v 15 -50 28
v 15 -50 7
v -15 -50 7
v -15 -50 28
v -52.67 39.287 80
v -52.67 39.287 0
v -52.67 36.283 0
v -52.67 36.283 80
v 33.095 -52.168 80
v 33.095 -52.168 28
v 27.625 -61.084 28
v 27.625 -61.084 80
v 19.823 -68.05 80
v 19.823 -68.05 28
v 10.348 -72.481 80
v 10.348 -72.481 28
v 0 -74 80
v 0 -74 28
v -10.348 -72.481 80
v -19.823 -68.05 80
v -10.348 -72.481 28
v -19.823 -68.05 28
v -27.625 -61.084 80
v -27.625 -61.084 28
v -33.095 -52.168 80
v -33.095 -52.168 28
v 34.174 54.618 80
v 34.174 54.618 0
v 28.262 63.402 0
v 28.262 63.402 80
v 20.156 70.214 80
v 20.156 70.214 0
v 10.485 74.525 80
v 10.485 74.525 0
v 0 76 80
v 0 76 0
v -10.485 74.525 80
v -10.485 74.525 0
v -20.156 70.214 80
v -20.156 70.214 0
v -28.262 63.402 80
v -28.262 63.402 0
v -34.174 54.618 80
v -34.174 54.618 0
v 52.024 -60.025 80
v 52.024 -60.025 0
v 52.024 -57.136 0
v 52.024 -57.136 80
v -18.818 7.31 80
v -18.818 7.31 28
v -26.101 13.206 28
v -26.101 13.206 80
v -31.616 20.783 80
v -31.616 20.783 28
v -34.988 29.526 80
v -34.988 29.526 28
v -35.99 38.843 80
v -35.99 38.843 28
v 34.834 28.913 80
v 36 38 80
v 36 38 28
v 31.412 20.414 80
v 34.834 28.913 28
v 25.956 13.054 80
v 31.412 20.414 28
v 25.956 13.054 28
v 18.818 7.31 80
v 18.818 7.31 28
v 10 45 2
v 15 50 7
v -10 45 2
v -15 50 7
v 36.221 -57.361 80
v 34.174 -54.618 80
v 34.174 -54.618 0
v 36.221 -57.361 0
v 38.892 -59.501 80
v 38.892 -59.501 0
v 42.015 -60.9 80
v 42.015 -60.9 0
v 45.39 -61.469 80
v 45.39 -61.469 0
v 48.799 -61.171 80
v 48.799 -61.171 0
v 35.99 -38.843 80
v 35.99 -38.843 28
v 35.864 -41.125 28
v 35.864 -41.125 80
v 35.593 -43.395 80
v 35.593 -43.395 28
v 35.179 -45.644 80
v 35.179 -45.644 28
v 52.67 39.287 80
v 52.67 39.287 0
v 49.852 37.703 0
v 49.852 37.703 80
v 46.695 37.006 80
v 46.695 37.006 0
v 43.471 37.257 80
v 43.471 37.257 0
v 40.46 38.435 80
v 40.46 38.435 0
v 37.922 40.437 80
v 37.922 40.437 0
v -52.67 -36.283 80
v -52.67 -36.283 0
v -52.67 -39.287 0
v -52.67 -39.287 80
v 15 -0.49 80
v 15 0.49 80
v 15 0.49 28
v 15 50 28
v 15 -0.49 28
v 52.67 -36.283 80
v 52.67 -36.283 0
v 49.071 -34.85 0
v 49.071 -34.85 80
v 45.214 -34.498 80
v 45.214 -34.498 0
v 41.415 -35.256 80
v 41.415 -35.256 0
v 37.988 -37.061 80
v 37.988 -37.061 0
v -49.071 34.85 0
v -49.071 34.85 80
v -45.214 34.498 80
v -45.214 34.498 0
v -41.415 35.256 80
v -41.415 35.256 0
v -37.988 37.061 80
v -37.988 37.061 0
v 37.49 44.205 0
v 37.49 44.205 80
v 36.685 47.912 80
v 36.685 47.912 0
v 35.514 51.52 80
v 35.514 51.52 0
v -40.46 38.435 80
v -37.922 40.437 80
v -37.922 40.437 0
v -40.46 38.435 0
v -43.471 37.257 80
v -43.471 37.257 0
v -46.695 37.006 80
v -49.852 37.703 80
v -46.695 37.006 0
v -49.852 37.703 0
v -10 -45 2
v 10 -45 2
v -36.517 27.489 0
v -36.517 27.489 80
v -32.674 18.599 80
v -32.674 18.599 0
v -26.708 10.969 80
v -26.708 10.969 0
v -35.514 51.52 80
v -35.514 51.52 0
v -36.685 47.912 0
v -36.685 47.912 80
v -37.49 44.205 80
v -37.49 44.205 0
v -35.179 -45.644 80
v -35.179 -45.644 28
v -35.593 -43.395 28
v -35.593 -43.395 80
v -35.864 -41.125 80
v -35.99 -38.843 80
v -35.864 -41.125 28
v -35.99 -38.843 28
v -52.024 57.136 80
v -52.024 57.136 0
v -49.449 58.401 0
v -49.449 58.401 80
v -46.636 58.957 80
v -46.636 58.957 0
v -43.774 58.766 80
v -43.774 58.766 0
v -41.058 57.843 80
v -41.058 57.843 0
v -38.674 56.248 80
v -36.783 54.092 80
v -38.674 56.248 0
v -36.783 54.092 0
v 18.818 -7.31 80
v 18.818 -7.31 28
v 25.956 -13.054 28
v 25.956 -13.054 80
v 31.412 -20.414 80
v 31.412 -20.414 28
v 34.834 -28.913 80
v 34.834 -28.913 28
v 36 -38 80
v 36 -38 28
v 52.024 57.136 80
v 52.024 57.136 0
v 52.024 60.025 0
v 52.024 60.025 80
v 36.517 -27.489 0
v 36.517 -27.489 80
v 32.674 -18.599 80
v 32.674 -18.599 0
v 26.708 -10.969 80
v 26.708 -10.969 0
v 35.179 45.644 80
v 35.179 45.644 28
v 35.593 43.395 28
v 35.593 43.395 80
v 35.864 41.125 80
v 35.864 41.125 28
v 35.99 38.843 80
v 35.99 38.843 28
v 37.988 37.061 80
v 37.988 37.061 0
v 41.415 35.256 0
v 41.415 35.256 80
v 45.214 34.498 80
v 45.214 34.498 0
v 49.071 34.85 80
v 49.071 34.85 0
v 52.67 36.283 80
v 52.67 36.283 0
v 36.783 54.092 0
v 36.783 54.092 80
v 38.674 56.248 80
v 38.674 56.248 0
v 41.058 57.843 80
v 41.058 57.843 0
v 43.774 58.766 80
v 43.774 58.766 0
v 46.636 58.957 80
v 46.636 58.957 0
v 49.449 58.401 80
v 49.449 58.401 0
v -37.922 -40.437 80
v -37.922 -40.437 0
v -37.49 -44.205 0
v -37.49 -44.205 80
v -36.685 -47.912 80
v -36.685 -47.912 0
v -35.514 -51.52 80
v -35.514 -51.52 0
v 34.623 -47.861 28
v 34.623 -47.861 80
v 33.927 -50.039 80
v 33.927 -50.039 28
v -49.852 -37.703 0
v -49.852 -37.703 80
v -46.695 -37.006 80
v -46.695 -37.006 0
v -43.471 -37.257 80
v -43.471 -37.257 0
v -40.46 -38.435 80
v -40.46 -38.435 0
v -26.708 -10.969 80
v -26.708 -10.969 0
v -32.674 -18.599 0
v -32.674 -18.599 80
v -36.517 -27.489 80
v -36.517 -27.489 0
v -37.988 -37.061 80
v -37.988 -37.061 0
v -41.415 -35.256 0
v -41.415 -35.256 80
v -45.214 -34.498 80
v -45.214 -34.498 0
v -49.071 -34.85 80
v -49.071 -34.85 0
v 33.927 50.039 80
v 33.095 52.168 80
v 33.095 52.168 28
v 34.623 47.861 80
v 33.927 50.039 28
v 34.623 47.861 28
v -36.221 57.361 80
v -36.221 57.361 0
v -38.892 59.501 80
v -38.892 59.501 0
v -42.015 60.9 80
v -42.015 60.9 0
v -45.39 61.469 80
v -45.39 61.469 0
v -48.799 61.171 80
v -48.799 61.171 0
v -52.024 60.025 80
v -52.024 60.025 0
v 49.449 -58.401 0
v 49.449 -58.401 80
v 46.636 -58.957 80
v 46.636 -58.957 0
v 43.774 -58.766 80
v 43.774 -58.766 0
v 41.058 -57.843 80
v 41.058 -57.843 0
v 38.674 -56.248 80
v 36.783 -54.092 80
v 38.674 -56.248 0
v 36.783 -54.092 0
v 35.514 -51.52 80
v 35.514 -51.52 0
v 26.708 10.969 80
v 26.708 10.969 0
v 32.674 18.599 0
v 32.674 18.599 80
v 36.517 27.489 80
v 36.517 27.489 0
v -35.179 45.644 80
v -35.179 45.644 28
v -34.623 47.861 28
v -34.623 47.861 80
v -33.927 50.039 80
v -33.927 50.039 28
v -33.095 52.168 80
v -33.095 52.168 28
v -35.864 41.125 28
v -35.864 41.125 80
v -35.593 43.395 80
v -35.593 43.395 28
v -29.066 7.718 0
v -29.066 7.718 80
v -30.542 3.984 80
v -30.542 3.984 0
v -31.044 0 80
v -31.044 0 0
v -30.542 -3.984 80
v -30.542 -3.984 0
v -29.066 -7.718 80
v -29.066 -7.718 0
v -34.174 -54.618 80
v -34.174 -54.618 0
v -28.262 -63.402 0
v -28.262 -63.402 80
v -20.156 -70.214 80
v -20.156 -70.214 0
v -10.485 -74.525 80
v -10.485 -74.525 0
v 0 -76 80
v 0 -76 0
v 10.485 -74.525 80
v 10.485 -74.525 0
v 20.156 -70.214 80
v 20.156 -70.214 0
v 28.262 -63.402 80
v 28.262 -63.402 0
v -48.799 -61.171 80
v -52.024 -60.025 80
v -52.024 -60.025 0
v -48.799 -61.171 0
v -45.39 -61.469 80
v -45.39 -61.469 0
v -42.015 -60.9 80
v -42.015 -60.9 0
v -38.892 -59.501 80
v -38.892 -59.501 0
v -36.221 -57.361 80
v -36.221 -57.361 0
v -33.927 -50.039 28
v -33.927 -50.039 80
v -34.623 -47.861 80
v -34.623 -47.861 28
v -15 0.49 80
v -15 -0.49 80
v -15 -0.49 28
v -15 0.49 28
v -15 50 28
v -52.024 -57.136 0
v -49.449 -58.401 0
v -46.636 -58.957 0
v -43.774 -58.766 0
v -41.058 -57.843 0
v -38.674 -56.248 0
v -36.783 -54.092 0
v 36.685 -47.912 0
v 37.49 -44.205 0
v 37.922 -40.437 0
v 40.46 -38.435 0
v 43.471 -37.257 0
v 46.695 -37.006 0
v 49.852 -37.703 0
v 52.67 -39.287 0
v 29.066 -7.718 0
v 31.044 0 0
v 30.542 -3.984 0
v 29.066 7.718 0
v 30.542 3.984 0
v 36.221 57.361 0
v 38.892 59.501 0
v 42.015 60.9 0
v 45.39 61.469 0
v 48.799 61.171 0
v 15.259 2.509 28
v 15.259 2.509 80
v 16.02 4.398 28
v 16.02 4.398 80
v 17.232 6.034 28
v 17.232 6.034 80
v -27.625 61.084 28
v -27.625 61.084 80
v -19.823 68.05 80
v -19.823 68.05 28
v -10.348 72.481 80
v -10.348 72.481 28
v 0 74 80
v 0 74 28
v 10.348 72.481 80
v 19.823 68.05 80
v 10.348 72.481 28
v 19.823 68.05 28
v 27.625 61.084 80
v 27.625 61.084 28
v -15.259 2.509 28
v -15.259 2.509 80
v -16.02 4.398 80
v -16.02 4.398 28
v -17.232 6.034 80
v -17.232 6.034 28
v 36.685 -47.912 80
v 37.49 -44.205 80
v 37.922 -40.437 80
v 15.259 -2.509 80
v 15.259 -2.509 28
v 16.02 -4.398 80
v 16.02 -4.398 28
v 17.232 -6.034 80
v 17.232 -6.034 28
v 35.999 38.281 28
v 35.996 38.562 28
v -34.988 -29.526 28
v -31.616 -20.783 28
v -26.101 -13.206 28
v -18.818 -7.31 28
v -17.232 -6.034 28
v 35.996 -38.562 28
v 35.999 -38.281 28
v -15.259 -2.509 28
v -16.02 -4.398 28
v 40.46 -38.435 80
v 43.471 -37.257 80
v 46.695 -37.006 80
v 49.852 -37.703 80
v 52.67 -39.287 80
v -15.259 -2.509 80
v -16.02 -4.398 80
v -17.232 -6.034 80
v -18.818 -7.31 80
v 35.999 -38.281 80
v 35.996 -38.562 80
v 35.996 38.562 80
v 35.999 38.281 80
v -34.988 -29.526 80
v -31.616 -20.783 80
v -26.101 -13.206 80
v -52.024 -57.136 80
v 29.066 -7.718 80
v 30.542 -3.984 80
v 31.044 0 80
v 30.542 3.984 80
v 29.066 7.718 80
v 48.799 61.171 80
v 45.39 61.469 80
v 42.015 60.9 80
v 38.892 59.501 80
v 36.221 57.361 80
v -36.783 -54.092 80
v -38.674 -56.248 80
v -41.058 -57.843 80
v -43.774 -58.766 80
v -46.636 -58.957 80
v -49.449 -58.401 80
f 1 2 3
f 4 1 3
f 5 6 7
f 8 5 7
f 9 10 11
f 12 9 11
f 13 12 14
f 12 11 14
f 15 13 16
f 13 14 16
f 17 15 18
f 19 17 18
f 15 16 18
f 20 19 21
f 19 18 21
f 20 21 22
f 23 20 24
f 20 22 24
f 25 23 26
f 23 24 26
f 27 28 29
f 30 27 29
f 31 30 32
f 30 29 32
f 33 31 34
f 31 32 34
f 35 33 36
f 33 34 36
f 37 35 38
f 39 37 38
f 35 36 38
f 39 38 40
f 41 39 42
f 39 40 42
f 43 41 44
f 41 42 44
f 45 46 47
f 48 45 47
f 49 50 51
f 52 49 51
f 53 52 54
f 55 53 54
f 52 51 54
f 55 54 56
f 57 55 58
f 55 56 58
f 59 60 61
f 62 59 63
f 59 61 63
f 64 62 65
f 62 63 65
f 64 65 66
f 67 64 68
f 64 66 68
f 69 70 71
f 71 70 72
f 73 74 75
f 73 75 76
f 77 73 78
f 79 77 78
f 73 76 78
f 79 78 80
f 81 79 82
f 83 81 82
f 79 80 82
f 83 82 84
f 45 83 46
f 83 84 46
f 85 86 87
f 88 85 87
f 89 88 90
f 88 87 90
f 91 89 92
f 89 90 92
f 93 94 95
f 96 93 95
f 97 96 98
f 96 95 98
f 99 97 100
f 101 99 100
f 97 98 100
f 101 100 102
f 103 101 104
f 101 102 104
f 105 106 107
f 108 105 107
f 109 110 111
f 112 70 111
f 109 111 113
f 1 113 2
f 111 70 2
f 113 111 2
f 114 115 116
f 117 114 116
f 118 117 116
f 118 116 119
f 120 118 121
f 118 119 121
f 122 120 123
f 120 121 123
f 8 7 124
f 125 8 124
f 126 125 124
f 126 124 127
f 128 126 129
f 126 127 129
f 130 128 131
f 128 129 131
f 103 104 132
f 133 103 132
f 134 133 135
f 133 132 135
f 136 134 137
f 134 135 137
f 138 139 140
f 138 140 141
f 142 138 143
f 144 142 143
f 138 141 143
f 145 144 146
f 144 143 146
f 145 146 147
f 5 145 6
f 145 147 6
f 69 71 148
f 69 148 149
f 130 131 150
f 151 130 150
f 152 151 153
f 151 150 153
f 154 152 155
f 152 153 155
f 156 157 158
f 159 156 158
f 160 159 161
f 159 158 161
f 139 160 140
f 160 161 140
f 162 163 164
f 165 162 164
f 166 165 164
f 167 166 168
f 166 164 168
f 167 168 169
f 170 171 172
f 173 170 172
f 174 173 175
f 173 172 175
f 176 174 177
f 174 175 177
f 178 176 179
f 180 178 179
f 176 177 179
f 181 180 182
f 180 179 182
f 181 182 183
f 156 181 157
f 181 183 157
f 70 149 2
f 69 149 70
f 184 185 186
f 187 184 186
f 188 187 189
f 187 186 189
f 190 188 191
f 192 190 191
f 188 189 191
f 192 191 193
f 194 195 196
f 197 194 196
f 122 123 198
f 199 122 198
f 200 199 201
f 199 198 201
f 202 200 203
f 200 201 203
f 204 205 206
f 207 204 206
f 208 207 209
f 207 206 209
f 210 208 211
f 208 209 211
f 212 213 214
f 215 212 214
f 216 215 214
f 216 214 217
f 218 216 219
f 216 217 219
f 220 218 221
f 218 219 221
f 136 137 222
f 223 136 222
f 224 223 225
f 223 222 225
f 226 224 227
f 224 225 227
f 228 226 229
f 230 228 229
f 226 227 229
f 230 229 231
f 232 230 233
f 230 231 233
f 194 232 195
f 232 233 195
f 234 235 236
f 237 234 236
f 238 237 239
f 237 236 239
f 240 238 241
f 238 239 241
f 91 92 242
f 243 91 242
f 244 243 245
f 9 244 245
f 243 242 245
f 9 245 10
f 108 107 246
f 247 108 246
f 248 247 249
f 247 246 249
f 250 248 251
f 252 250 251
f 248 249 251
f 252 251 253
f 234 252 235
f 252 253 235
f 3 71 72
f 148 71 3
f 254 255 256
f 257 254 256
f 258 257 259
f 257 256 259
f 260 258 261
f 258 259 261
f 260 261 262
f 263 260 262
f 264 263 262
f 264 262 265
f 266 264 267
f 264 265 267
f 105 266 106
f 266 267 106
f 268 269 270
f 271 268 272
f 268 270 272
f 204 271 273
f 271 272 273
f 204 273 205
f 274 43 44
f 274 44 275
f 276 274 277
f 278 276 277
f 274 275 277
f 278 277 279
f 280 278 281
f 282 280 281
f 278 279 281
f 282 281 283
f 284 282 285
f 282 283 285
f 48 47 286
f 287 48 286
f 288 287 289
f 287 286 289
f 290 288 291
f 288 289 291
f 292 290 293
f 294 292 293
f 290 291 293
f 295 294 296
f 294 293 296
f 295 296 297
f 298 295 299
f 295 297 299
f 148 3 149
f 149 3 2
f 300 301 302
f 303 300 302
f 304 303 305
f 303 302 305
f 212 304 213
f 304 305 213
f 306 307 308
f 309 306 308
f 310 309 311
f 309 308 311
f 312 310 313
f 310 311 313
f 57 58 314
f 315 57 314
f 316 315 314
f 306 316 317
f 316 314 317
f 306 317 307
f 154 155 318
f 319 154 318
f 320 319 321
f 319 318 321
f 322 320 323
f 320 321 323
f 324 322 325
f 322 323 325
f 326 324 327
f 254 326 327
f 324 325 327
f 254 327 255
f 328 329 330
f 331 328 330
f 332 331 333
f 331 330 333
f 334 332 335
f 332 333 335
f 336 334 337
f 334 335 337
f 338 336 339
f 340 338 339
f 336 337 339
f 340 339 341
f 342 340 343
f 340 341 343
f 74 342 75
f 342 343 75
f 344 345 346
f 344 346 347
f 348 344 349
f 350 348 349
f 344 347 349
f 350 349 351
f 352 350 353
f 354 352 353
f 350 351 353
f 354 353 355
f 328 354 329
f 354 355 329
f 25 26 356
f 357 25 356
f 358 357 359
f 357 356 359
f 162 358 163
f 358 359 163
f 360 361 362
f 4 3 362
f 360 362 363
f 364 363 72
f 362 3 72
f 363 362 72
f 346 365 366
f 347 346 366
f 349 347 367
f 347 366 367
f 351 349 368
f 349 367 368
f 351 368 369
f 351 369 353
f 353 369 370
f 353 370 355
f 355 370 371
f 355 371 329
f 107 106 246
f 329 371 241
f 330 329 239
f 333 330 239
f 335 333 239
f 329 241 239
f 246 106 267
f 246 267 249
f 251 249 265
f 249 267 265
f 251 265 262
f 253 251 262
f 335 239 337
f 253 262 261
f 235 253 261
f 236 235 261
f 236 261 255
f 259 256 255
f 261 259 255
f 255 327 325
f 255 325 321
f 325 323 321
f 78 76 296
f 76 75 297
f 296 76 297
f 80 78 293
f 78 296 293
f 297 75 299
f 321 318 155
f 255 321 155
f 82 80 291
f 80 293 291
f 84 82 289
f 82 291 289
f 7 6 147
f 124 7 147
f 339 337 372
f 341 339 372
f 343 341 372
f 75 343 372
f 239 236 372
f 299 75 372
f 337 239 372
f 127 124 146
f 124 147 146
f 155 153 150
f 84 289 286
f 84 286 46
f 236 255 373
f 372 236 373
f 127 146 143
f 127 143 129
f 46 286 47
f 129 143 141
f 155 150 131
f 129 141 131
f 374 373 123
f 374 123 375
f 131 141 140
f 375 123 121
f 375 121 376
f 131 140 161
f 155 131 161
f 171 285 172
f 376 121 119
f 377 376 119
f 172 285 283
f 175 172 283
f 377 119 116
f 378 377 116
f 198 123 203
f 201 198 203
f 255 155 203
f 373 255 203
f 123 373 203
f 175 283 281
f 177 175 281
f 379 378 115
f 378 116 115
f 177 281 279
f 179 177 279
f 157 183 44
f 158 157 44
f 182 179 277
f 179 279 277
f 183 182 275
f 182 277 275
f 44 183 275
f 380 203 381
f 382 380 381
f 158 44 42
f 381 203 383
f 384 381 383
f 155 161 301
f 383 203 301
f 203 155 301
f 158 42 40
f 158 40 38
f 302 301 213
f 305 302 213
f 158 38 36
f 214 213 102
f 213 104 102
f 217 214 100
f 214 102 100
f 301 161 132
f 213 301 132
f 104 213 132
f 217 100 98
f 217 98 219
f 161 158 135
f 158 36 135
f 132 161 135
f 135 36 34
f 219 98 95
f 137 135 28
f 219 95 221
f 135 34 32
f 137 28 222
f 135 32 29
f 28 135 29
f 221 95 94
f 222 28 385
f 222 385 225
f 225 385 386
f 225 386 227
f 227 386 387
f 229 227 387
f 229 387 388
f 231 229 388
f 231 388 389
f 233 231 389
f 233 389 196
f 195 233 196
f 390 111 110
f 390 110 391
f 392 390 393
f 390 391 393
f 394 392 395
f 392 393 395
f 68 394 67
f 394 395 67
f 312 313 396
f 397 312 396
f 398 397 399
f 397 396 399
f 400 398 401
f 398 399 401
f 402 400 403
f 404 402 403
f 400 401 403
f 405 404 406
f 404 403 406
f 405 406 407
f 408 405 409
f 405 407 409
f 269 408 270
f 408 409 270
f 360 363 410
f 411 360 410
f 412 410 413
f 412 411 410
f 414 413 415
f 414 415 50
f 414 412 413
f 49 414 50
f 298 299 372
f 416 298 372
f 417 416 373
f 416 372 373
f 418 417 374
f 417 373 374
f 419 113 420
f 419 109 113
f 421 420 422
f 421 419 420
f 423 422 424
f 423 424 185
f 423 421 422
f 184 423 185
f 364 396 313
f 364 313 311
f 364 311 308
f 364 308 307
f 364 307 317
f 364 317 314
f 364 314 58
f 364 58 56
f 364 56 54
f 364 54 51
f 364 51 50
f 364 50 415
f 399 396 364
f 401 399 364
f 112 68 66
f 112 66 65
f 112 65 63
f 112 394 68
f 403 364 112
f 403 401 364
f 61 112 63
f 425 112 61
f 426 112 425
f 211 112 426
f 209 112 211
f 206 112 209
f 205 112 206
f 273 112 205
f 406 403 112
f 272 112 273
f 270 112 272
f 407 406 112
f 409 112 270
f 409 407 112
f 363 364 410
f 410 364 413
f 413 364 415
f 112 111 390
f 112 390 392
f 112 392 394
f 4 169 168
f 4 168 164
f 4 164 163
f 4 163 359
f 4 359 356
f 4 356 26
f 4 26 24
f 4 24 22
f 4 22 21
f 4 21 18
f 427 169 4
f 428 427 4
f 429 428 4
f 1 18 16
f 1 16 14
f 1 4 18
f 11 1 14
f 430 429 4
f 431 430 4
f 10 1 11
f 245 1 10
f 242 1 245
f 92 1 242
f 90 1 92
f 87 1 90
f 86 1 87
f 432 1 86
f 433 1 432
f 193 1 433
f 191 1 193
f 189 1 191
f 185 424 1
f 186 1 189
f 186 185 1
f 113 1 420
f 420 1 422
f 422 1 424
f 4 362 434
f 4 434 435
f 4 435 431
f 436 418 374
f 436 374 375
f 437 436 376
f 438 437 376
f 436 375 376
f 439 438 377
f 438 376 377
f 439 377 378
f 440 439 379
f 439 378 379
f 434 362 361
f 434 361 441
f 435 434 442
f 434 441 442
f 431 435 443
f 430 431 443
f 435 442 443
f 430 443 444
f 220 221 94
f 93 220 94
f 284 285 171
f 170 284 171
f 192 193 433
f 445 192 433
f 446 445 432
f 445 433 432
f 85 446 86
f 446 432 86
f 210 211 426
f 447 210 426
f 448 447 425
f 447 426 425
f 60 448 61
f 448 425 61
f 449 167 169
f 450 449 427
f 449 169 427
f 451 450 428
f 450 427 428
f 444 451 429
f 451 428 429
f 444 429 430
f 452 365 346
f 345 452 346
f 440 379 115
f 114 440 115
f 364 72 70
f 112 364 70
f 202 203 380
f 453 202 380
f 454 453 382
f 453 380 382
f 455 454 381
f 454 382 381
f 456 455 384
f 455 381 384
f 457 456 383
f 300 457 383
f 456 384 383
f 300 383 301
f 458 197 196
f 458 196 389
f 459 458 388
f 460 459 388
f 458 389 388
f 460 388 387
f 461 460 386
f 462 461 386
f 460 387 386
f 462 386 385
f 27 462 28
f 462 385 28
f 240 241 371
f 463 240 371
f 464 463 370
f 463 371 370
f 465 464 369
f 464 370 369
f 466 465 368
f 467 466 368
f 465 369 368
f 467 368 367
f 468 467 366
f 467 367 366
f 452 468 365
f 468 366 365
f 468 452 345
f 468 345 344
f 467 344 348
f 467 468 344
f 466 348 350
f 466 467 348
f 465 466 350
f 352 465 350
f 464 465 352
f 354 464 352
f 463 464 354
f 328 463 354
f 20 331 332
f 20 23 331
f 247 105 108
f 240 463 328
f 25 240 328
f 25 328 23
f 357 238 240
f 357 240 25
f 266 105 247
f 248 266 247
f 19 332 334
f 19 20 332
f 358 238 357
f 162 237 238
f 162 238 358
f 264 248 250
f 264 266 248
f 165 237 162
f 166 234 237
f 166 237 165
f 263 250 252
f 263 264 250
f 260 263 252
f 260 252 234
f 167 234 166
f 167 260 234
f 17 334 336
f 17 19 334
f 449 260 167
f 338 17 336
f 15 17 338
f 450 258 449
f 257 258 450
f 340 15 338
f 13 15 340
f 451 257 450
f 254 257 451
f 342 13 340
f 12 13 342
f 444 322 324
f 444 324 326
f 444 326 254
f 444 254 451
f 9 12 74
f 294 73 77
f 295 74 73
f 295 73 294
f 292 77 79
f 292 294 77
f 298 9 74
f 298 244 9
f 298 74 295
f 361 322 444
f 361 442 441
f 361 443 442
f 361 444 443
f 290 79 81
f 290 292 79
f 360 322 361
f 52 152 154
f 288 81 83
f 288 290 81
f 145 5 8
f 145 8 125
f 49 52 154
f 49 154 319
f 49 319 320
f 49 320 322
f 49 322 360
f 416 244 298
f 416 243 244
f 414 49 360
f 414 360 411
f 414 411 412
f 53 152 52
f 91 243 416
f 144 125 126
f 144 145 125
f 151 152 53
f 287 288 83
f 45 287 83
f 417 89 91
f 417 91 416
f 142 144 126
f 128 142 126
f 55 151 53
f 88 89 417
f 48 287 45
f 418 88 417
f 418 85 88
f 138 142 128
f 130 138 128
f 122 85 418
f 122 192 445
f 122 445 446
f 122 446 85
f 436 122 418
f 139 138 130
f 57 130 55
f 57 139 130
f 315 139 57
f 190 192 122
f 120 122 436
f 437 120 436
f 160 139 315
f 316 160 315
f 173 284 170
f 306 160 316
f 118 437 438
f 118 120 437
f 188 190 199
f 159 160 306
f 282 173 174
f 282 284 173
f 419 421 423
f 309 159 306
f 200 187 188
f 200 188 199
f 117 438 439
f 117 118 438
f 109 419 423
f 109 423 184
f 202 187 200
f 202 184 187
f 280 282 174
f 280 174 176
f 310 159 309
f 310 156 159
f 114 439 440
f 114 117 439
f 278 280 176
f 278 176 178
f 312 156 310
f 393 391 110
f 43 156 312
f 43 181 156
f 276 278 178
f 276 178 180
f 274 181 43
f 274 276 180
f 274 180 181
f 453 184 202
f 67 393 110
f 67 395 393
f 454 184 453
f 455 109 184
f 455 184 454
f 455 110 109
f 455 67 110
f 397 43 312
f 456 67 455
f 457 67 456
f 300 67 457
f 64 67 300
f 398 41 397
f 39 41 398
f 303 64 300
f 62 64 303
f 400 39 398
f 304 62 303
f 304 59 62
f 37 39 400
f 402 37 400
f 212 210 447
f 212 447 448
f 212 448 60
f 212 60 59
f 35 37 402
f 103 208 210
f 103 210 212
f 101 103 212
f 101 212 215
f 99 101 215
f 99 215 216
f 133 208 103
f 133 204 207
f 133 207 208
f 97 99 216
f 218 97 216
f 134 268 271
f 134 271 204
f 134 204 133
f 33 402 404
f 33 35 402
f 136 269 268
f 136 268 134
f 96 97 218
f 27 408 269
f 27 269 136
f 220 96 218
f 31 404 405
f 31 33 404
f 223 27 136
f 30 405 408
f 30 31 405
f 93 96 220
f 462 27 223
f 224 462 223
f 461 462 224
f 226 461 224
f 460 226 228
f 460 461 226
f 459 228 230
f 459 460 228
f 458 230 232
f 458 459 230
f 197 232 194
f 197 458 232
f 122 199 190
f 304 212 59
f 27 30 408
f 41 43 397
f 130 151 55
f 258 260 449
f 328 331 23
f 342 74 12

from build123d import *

# Parameters (mm, degrees)
F1_DEPTH = 80
F2_DEPTH = 28
F3_DEPTH = 2
F4_SIZE  = 5
F5_R     = 8


with BuildPart() as f1:
    # F0 (on Top) → F1 (new body)
    with BuildSketch(Plane.XY):
        with BuildLine():
            ThreePointArc((35.9901375525, 38.8426143551), (35.9975343037, 38.4213360355), (36, 38))
            ThreePointArc((36, 38), (30.2985148151, 18.5577779048), (15, 5.2738636561))
            Line((15, 5.2738636561), (15, 3.0858194998))
            ThreePointArc((15, 3.0858194998), (21.2234490436, 6.479130553), (26.7084002829, 10.9692516876))
            ThreePointArc((26.7084002829, 10.9692516876), (34.8800432225, 22.9207896494), (37.9884032406, 37.061267222))
            ThreePointArc((37.9884032406, 37.061267222), (36.9450072331, 37.9022876024), (35.9901375525, 38.8426143551))
        make_face()
        with BuildLine():
            ThreePointArc((35.1791296525, 45.6438757771), (35.7467542283, 42.2625769371), (35.9901375525, 38.8426143551))
            ThreePointArc((35.9901375525, 38.8426143551), (36.9450072331, 37.9022876024), (37.9884032406, 37.061267222))
            ThreePointArc((37.9884032406, 37.061267222), (37.9971006995, 37.5305977968), (38, 38))
            ThreePointArc((38, 38), (37.9804456747, 39.2189119535), (37.9218028237, 40.4365694333))
            ThreePointArc((37.9218028237, 40.4365694333), (36.1957376365, 42.853388078), (35.1791296525, 45.6438757771))
        make_face()
        with BuildLine():
            ThreePointArc((35.5135906601, 51.5197957984), (34.9460846772, 48.604619716), (35.1791296525, 45.6438757771))
            ThreePointArc((35.1791296525, 45.6438757771), (36.1957376365, 42.853388078), (37.9218028237, 40.4365694333))
            ThreePointArc((37.9218028237, 40.4365694333), (37.133525697, 46.0685357598), (35.5135906601, 51.5197957984))
        make_face()
        with BuildLine():
            ThreePointArc((33.0946454877, 52.1684311073), (34.2924124047, 48.9558409747), (35.1791296525, 45.6438757771))
            ThreePointArc((35.1791296525, 45.6438757771), (34.9460846772, 48.604619716), (35.5135906601, 51.5197957984))
            ThreePointArc((35.5135906601, 51.5197957984), (34.8779796603, 53.083982724), (34.1735140679, 54.6183915062))
            ThreePointArc((34.1735140679, 54.6183915062), (33.5732028181, 53.4202191846), (33.0946454877, 52.1684311073))
        make_face()
        with BuildLine():
            ThreePointArc((38, 38), (37.9971006995, 37.5305977968), (37.9884032406, 37.061267222))
            ThreePointArc((37.9884032406, 37.061267222), (45.2139181623, 34.4984199692), (52.669826296, 36.2832689338))
            Line((52.669826296, 36.2832689338), (52.669826296, 39.2874432971))
            ThreePointArc((52.669826296, 39.2874432971), (45.0738077793, 37.0127445593), (37.9218028237, 40.4365694333))
            ThreePointArc((37.9218028237, 40.4365694333), (37.9804456747, 39.2189119535), (38, 38))
        make_face()
        with BuildLine():
            Line((-15, 3.0858194998), (-15, 5.2738636561))
            ThreePointArc((-15, 5.2738636561), (-30.5239870885, 18.9137166473), (-35.9901375525, 38.8426143551))
            ThreePointArc((-35.9901375525, 38.8426143551), (-36.9450072331, 37.9022876024), (-37.9884032406, 37.061267222))
            ThreePointArc((-37.9884032406, 37.061267222), (-34.8800432225, 22.9207896494), (-26.7084002829, 10.9692516876))
            ThreePointArc((-26.7084002829, 10.9692516876), (-21.2234490436, 6.479130553), (-15, 3.0858194998))
        make_face()
        with BuildLine():
            ThreePointArc((26.7084002829, 10.9692516876), (21.2234490436, 6.479130553), (15, 3.0858194998))
            Line((15, 3.0858194998), (15, -3.0858194998))
            ThreePointArc((15, -3.0858194998), (21.2234490436, -6.479130553), (26.7084002829, -10.9692516876))
            ThreePointArc((26.7084002829, -10.9692516876), (31.0440368913, 0), (26.7084002829, 10.9692516876))
        make_face()
        with BuildLine():
            ThreePointArc((-33.0946454877, 52.1684311073), (0, 74), (33.0946454877, 52.1684311073))
            ThreePointArc((33.0946454877, 52.1684311073), (33.5732028181, 53.4202191846), (34.1735140679, 54.6183915062))
            ThreePointArc((34.1735140679, 54.6183915062), (0, 76), (-34.1735140679, 54.6183915062))
            ThreePointArc((-34.1735140679, 54.6183915062), (-33.5732028181, 53.4202191846), (-33.0946454877, 52.1684311073))
        make_face()
        with BuildLine():
            ThreePointArc((34.1735140679, 54.6183915062), (34.8779796603, 53.083982724), (35.5135906601, 51.5197957984))
            ThreePointArc((35.5135906601, 51.5197957984), (42.3857590226, 58.3934543446), (52.0238642089, 57.1361523796))
            Line((52.0238642089, 57.1361523796), (52.0238642089, 60.0250099634))
            ThreePointArc((52.0238642089, 60.0250099634), (42.0149177213, 60.8998521098), (34.1735140679, 54.6183915062))
        make_face()
        with BuildLine():
            ThreePointArc((-37.9884032406, 37.061267222), (-36.9450072331, 37.9022876024), (-35.9901375525, 38.8426143551))
            ThreePointArc((-35.9901375525, 38.8426143551), (-35.7467542312, 42.2625769128), (-35.1791296629, 45.6438757292))
            ThreePointArc((-35.1791296629, 45.6438757292), (-36.1957376479, 42.8533880563), (-37.9218028237, 40.4365694333))
            ThreePointArc((-37.9218028237, 40.4365694333), (-37.9926047072, 38.749658299), (-37.9884032406, 37.061267222))
        make_face()
        with BuildLine():
            Line((-15, -3.0858194998), (-15, 3.0858194998))
            ThreePointArc((-15, 3.0858194998), (-21.2234490436, 6.479130553), (-26.7084002829, 10.9692516876))
            ThreePointArc((-26.7084002829, 10.9692516876), (-31.0440368913, 0), (-26.7084002829, -10.9692516876))
            ThreePointArc((-26.7084002829, -10.9692516876), (-21.2234490436, -6.479130553), (-15, -3.0858194998))
        make_face()
        with BuildLine():
            ThreePointArc((26.7084002829, -10.9692516876), (21.2234490436, -6.479130553), (15, -3.0858194998))
            Line((15, -3.0858194998), (15, -5.2738636561))
            ThreePointArc((15, -5.2738636561), (30.2985148151, -18.5577779048), (36, -38))
            ThreePointArc((36, -38), (35.9975343037, -38.4213360355), (35.9901375525, -38.8426143551))
            ThreePointArc((35.9901375525, -38.8426143551), (36.9450072331, -37.9022876024), (37.9884032406, -37.061267222))
            ThreePointArc((37.9884032406, -37.061267222), (34.8800432225, -22.9207896494), (26.7084002829, -10.9692516876))
        make_face()
        with BuildLine():
            ThreePointArc((-35.1791296629, 45.6438757292), (-34.2924124122, 48.9558409514), (-33.0946454877, 52.1684311073))
            ThreePointArc((-33.0946454877, 52.1684311073), (-33.5732028181, 53.4202191846), (-34.1735140679, 54.6183915062))
            ThreePointArc((-34.1735140679, 54.6183915062), (-34.8779796603, 53.083982724), (-35.5135906601, 51.5197957984))
            ThreePointArc((-35.5135906601, 51.5197957984), (-34.9460846758, 48.6046196915), (-35.1791296629, 45.6438757292))
        make_face()
        with BuildLine():
            ThreePointArc((-37.9218028237, 40.4365694333), (-36.1957376479, 42.8533880563), (-35.1791296629, 45.6438757292))
            ThreePointArc((-35.1791296629, 45.6438757292), (-34.9460846758, 48.6046196915), (-35.5135906601, 51.5197957984))
            ThreePointArc((-35.5135906601, 51.5197957984), (-37.133525697, 46.0685357598), (-37.9218028237, 40.4365694333))
        make_face()
        with BuildLine():
            ThreePointArc((-52.669826296, 36.2832689338), (-45.2139181623, 34.4984199692), (-37.9884032406, 37.061267222))
            ThreePointArc((-37.9884032406, 37.061267222), (-37.9926047072, 38.749658299), (-37.9218028237, 40.4365694333))
            ThreePointArc((-37.9218028237, 40.4365694333), (-45.0738077793, 37.0127445593), (-52.669826296, 39.2874432971))
            Line((-52.669826296, 39.2874432971), (-52.669826296, 36.2832689338))
        make_face()
        with BuildLine():
            Line((-15, -5.2738636561), (-15, -3.0858194998))
            ThreePointArc((-15, -3.0858194998), (-21.2234490436, -6.479130553), (-26.7084002829, -10.9692516876))
            ThreePointArc((-26.7084002829, -10.9692516876), (-34.8800432225, -22.9207896494), (-37.9884032406, -37.061267222))
            ThreePointArc((-37.9884032406, -37.061267222), (-36.9450072331, -37.9022876024), (-35.9901375525, -38.8426143551))
            ThreePointArc((-35.9901375525, -38.8426143551), (-30.5239870885, -18.9137166473), (-15, -5.2738636561))
        make_face()
        with BuildLine():
            ThreePointArc((-35.5135906601, 51.5197957984), (-34.8779796603, 53.083982724), (-34.1735140679, 54.6183915062))
            ThreePointArc((-34.1735140679, 54.6183915062), (-42.0149177213, 60.8998521098), (-52.0238642089, 60.0250099634))
            Line((-52.0238642089, 60.0250099634), (-52.0238642089, 57.1361523796))
            ThreePointArc((-52.0238642089, 57.1361523796), (-42.3857590226, 58.3934543446), (-35.5135906601, 51.5197957984))
        make_face()
        with BuildLine():
            ThreePointArc((52.669826296, -36.2832689338), (45.2139181623, -34.4984199692), (37.9884032406, -37.061267222))
            ThreePointArc((37.9884032406, -37.061267222), (37.9971006995, -37.5305977968), (38, -38))
            ThreePointArc((38, -38), (37.9804456747, -39.2189119535), (37.9218028237, -40.4365694333))
            ThreePointArc((37.9218028237, -40.4365694333), (45.0738077793, -37.0127445593), (52.669826296, -39.2874432971))
            Line((52.669826296, -39.2874432971), (52.669826296, -36.2832689338))
        make_face()
        with BuildLine():
            ThreePointArc((38, -38), (37.9971006995, -37.5305977968), (37.9884032406, -37.061267222))
            ThreePointArc((37.9884032406, -37.061267222), (36.9450072331, -37.9022876024), (35.9901375525, -38.8426143551))
            ThreePointArc((35.9901375525, -38.8426143551), (35.746754198, -42.2625771912), (35.1791295438, -45.6438762771))
            ThreePointArc((35.1791295438, -45.6438762771), (36.1957375172, -42.8533883044), (37.9218028237, -40.4365694333))
            ThreePointArc((37.9218028237, -40.4365694333), (37.9804456747, -39.2189119535), (38, -38))
        make_face()
        with BuildLine():
            ThreePointArc((-35.9901375525, -38.8426143551), (-36.9450072331, -37.9022876024), (-37.9884032406, -37.061267222))
            ThreePointArc((-37.9884032406, -37.061267222), (-37.9926047072, -38.749658299), (-37.9218028237, -40.4365694333))
            ThreePointArc((-37.9218028237, -40.4365694333), (-36.1957375881, -42.8533881697), (-35.1791296084, -45.6438759798))
            ThreePointArc((-35.1791296084, -45.6438759798), (-35.746754216, -42.2625770401), (-35.9901375525, -38.8426143551))
        make_face()
        with BuildLine():
            ThreePointArc((-37.9218028237, -40.4365694333), (-37.9926047072, -38.749658299), (-37.9884032406, -37.061267222))
            ThreePointArc((-37.9884032406, -37.061267222), (-45.2139181623, -34.4984199692), (-52.669826296, -36.2832689338))
            Line((-52.669826296, -36.2832689338), (-52.669826296, -39.2874432971))
            ThreePointArc((-52.669826296, -39.2874432971), (-45.0738077793, -37.0127445593), (-37.9218028237, -40.4365694333))
        make_face()
        with BuildLine():
            ThreePointArc((35.5135906601, -51.5197957984), (37.133525697, -46.0685357598), (37.9218028237, -40.4365694333))
            ThreePointArc((37.9218028237, -40.4365694333), (36.1957375172, -42.8533883044), (35.1791295438, -45.6438762771))
            ThreePointArc((35.1791295438, -45.6438762771), (34.9460846917, -48.6046199714), (35.5135906601, -51.5197957984))
        make_face()
        with BuildLine():
            ThreePointArc((35.5135906601, -51.5197957984), (34.9460846917, -48.6046199714), (35.1791295438, -45.6438762771))
            ThreePointArc((35.1791295438, -45.6438762771), (34.2924123269, -48.9558412184), (33.0946454877, -52.1684311073))
            ThreePointArc((33.0946454877, -52.1684311073), (33.5732028181, -53.4202191846), (34.1735140679, -54.6183915062))
            ThreePointArc((34.1735140679, -54.6183915062), (34.8779796603, -53.083982724), (35.5135906601, -51.5197957984))
        make_face()
        with BuildLine():
            ThreePointArc((-35.1791296084, -45.6438759798), (-36.1957375881, -42.8533881697), (-37.9218028237, -40.4365694333))
            ThreePointArc((-37.9218028237, -40.4365694333), (-37.133525697, -46.0685357598), (-35.5135906601, -51.5197957984))
            ThreePointArc((-35.5135906601, -51.5197957984), (-34.9460846831, -48.6046198195), (-35.1791296084, -45.6438759798))
        make_face()
        with BuildLine():
            ThreePointArc((-33.0946454877, -52.1684311073), (-34.2924123732, -48.9558410735), (-35.1791296084, -45.6438759798))
            ThreePointArc((-35.1791296084, -45.6438759798), (-34.9460846831, -48.6046198195), (-35.5135906601, -51.5197957984))
            ThreePointArc((-35.5135906601, -51.5197957984), (-34.8779796603, -53.083982724), (-34.1735140679, -54.6183915062))
            ThreePointArc((-34.1735140679, -54.6183915062), (-33.5732028181, -53.4202191846), (-33.0946454877, -52.1684311073))
        make_face()
        with BuildLine():
            ThreePointArc((52.0238642089, -57.1361523796), (42.3857590226, -58.3934543446), (35.5135906601, -51.5197957984))
            ThreePointArc((35.5135906601, -51.5197957984), (34.8779796603, -53.083982724), (34.1735140679, -54.6183915062))
            ThreePointArc((34.1735140679, -54.6183915062), (42.0149177213, -60.8998521098), (52.0238642089, -60.0250099634))
            Line((52.0238642089, -60.0250099634), (52.0238642089, -57.1361523796))
        make_face()
        with BuildLine():
            ThreePointArc((34.1735140679, -54.6183915062), (33.5732028181, -53.4202191846), (33.0946454877, -52.1684311073))
            ThreePointArc((33.0946454877, -52.1684311073), (0, -74), (-33.0946454877, -52.1684311073))
            ThreePointArc((-33.0946454877, -52.1684311073), (-33.5732028181, -53.4202191846), (-34.1735140679, -54.6183915062))
            ThreePointArc((-34.1735140679, -54.6183915062), (0, -76), (34.1735140679, -54.6183915062))
        make_face()
        with BuildLine():
            ThreePointArc((-34.1735140679, -54.6183915062), (-34.8779796603, -53.083982724), (-35.5135906601, -51.5197957984))
            ThreePointArc((-35.5135906601, -51.5197957984), (-42.3857590226, -58.3934543446), (-52.0238642089, -57.1361523796))
            Line((-52.0238642089, -57.1361523796), (-52.0238642089, -60.0250099634))
            ThreePointArc((-52.0238642089, -60.0250099634), (-42.0149177213, -60.8998521098), (-34.1735140679, -54.6183915062))
        make_face()
    extrude(amount=F1_DEPTH)

    # F0 (on Top) → F2 (join)
    with BuildSketch(Plane.XY):
        with BuildLine():
            ThreePointArc((15, 5.2738636561), (30.2985148151, 18.5577779048), (36, 38))
            ThreePointArc((36, 38), (35.9975343037, 38.4213360355), (35.9901375525, 38.8426143551))
            ThreePointArc((35.9901375525, 38.8426143551), (35.7467542283, 42.2625769371), (35.1791296525, 45.6438757771))
            ThreePointArc((35.1791296525, 45.6438757771), (34.2924124047, 48.9558409747), (33.0946454877, 52.1684311073))
            ThreePointArc((33.0946454877, 52.1684311073), (0, 74), (-33.0946454877, 52.1684311073))
            ThreePointArc((-33.0946454877, 52.1684311073), (-34.2924124122, 48.9558409514), (-35.1791296629, 45.6438757292))
            ThreePointArc((-35.1791296629, 45.6438757292), (-35.7467542312, 42.2625769128), (-35.9901375525, 38.8426143551))
            ThreePointArc((-35.9901375525, 38.8426143551), (-30.5239870885, 18.9137166473), (-15, 5.2738636561))
            Line((-15, 5.2738636561), (-15, 50))
            Line((-15, 50), (15, 50))
            Line((15, 50), (15, 5.2738636561))
        make_face()
        with BuildLine():
            ThreePointArc((36, -38), (30.2985148151, -18.5577779048), (15, -5.2738636561))
            Line((15, -5.2738636561), (15, -50))
            Line((15, -50), (-15, -50))
            Line((-15, -50), (-15, -5.2738636561))
            ThreePointArc((-15, -5.2738636561), (-30.5239870885, -18.9137166473), (-35.9901375525, -38.8426143551))
            ThreePointArc((-35.9901375525, -38.8426143551), (-35.746754216, -42.2625770401), (-35.1791296084, -45.6438759798))
            ThreePointArc((-35.1791296084, -45.6438759798), (-34.2924123732, -48.9558410735), (-33.0946454877, -52.1684311073))
            ThreePointArc((-33.0946454877, -52.1684311073), (0, -74), (33.0946454877, -52.1684311073))
            ThreePointArc((33.0946454877, -52.1684311073), (34.2924123269, -48.9558412184), (35.1791295438, -45.6438762771))
            ThreePointArc((35.1791295438, -45.6438762771), (35.746754198, -42.2625771912), (35.9901375525, -38.8426143551))
            ThreePointArc((35.9901375525, -38.8426143551), (35.9975343037, -38.4213360355), (36, -38))
        make_face()
    extrude(amount=F2_DEPTH)

    # F0 (on Top) → F3 (join)
    with BuildSketch(Plane.XY):
        with BuildLine():
            ThreePointArc((-15, 5.2738636561), (0, 2), (15, 5.2738636561))
            Line((15, 5.2738636561), (15, 50))
            Line((15, 50), (-15, 50))
            Line((-15, 50), (-15, 5.2738636561))
        make_face()
        with BuildLine():
            Line((15, -50), (15, -5.2738636561))
            ThreePointArc((15, -5.2738636561), (0, -2), (-15, -5.2738636561))
            Line((-15, -5.2738636561), (-15, -50))
            Line((-15, -50), (15, -50))
        make_face()
        with BuildLine():
            ThreePointArc((0, 0), (-7.6570601732, 0.7794488286), (-15, 3.0858194998))
            Line((-15, 3.0858194998), (-15, -3.0858194998))
            ThreePointArc((-15, -3.0858194998), (-7.6570601732, -0.7794488286), (0, 0))
        make_face()
        with BuildLine():
            Line((15, 3.0858194998), (15, 5.2738636561))
            ThreePointArc((15, 5.2738636561), (0, 2), (-15, 5.2738636561))
            Line((-15, 5.2738636561), (-15, 3.0858194998))
            ThreePointArc((-15, 3.0858194998), (-7.6570601732, 0.7794488286), (0, 0))
            ThreePointArc((0, 0), (7.6570601732, 0.7794488286), (15, 3.0858194998))
        make_face()
        with BuildLine():
            ThreePointArc((15, -3.0858194998), (7.6570601732, -0.7794488286), (0, 0))
            ThreePointArc((0, 0), (-7.6570601732, -0.7794488286), (-15, -3.0858194998))
            Line((-15, -3.0858194998), (-15, -5.2738636561))
            ThreePointArc((-15, -5.2738636561), (0, -2), (15, -5.2738636561))
            Line((15, -5.2738636561), (15, -3.0858194998))
        make_face()
        with BuildLine():
            Line((15, -3.0858194998), (15, 3.0858194998))
            ThreePointArc((15, 3.0858194998), (7.6570601732, 0.7794488286), (0, 0))
            ThreePointArc((0, 0), (7.6570601732, -0.7794488286), (15, -3.0858194998))
        make_face()
    extrude(amount=F3_DEPTH)

    # F4
    f4_edges = [f1.edges().sort_by_distance(p)[0] for p in [
        (0, 50, 2),
        (-15, 0, 2),
        (0, -50, 2),
        (15, 0, 2),
    ]]
    chamfer(f4_edges, length=F4_SIZE)

    # F5
    f5_edges = [f1.edges().sort_by_distance(p)[0] for p in [
        (-15, -5.273864, 54),
        (-15, 5.273864, 54),
        (15, -5.273864, 54),
        (15, 5.273864, 54),
    ]]
    fillet(f5_edges, radius=F5_R)


solid = f1.part
